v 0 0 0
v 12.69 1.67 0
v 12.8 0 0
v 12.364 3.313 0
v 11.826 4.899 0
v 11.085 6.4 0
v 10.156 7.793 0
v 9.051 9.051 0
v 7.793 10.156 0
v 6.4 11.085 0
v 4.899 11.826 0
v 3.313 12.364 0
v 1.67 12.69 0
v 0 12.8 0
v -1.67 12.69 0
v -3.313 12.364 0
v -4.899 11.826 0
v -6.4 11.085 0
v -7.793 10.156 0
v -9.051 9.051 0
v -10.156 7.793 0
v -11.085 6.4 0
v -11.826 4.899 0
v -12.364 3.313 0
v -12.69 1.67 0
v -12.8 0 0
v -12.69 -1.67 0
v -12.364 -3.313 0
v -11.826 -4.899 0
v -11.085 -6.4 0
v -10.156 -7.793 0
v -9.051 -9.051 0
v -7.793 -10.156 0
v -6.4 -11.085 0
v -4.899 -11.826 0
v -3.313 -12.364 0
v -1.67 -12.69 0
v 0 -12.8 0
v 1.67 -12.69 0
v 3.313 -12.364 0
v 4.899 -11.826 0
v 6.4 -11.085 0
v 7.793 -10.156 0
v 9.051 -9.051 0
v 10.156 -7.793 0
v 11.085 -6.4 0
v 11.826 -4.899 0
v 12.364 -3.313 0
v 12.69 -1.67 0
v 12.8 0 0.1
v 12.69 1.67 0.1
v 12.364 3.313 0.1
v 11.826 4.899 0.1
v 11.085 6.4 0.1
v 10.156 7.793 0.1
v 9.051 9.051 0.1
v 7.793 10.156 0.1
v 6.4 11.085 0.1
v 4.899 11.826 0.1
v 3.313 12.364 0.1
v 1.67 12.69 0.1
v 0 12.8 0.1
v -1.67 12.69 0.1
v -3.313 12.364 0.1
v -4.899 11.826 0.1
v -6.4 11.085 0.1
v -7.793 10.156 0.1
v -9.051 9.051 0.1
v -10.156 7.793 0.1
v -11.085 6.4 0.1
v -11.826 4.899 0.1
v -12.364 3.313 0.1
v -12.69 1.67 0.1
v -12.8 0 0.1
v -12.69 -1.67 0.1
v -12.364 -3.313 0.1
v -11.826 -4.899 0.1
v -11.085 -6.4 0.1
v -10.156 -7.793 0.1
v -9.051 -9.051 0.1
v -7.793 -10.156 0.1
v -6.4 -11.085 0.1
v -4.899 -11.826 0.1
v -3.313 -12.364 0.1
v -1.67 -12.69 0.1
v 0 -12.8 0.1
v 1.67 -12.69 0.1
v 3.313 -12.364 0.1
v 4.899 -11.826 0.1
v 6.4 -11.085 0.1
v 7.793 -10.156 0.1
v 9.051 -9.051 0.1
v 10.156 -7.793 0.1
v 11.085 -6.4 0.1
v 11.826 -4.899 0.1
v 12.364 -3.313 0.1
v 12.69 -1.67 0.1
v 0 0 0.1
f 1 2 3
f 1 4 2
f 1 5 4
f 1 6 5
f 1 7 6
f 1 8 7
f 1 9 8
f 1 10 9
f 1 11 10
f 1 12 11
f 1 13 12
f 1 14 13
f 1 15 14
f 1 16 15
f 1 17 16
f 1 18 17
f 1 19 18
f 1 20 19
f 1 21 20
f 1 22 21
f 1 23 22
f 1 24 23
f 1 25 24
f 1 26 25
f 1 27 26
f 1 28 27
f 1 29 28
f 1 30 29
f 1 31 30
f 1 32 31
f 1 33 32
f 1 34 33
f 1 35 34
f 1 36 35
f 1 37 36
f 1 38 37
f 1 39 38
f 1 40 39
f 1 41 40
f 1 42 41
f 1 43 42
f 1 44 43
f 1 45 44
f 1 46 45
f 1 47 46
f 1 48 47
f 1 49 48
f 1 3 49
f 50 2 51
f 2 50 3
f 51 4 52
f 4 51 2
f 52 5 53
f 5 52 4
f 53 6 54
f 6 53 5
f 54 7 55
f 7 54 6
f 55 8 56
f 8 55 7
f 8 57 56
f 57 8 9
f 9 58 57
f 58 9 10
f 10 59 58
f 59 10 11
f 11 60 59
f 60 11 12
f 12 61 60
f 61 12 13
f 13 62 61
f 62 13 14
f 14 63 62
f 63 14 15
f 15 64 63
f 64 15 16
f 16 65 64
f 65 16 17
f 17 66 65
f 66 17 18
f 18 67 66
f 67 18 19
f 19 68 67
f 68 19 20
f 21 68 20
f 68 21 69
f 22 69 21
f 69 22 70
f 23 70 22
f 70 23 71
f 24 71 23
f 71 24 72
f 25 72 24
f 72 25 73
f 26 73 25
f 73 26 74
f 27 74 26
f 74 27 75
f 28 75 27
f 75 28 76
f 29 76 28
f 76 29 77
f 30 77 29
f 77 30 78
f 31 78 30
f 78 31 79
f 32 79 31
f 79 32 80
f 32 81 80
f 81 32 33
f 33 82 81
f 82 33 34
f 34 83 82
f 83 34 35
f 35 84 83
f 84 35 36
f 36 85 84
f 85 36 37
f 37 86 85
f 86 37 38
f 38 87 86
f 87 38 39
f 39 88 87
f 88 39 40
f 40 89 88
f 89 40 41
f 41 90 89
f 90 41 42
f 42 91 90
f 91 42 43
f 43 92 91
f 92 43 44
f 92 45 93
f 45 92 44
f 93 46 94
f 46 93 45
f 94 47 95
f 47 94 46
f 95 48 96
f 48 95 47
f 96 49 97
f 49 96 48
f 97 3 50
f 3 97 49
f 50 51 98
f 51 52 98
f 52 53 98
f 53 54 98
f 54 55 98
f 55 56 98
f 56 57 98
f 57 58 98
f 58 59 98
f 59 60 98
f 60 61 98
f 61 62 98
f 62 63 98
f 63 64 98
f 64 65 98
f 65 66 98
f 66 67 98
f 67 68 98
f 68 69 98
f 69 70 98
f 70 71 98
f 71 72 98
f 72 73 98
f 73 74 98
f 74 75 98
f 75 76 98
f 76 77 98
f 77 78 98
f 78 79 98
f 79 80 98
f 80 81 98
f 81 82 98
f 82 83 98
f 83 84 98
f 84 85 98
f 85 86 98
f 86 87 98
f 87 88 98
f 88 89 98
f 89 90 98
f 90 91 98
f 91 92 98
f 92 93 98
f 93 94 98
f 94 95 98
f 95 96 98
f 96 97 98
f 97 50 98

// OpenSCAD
// file: ../p/48/1-4cyli.scad
use <../../lib.scad>
function ldraw_lib__48__1_4cyli() = [
// 0 Hi-Res Cylinder 0.25
// 0 Name: 48\1-4cyli.dat
// 0 Author: Magnus Forsberg [MagFors]
// 0 !LDRAW_ORG 48_Primitive UPDATE 2024-01
// 0 !LICENSE Licensed under CC BY 4.0 : see CAreadme.txt
// 
// 0 BFC CERTIFY CCW
  [0,"BFC","CERTIFY"],
  [0,"BFC","CCW"],
// 
// 0 !HISTORY 1999-07-05 [PTadmin] Official Update 1999-05
// 0 !HISTORY 2002-02-28 [hafhead] Added BFC statement
// 0 !HISTORY 2002-04-25 [PTadmin] Official Update 2002-02
// 0 !HISTORY 2007-06-24 [PTadmin] Header formatted for Contributor Agreement
// 0 !HISTORY 2008-07-01 [PTadmin] Official Update 2008-01
// 0 !HISTORY 2008-07-07 [guyvivan] Made BFC'ed CCW (2005-12-06)
// 0 !HISTORY 2009-05-02 [PTadmin] Official Update 2009-01
// 0 !HISTORY 2024-01-03 [MagFors] Complete regeneration, original by Manfred Moolhuysen
// 0 !HISTORY 2024-01-29 [OrionP] Official Update 2024-01
// 
// 4 16 0.9914 0 0.1305 1 0 0 1 1 0 0.9914 1 0.1305
  [4,16,0.9914,0,0.1305,1,0,0,1,1,0,0.9914,1,0.1305],
// 4 16 0.9659 0 0.2588 0.9914 0 0.1305 0.9914 1 0.1305 0.9659 1 0.2588
  [4,16,0.9659,0,0.2588,0.9914,0,0.1305,0.9914,1,0.1305,0.9659,1,0.2588],
// 4 16 0.9239 0 0.3827 0.9659 0 0.2588 0.9659 1 0.2588 0.9239 1 0.3827
  [4,16,0.9239,0,0.3827,0.9659,0,0.2588,0.9659,1,0.2588,0.9239,1,0.3827],
// 4 16 0.866 0 0.5 0.9239 0 0.3827 0.9239 1 0.3827 0.866 1 0.5
  [4,16,0.866,0,0.5,0.9239,0,0.3827,0.9239,1,0.3827,0.866,1,0.5],
// 4 16 0.7934 0 0.6088 0.866 0 0.5 0.866 1 0.5 0.7934 1 0.6088
  [4,16,0.7934,0,0.6088,0.866,0,0.5,0.866,1,0.5,0.7934,1,0.6088],
// 4 16 0.7071 0 0.7071 0.7934 0 0.6088 0.7934 1 0.6088 0.7071 1 0.7071
  [4,16,0.7071,0,0.7071,0.7934,0,0.6088,0.7934,1,0.6088,0.7071,1,0.7071],
// 4 16 0.6088 0 0.7934 0.7071 0 0.7071 0.7071 1 0.7071 0.6088 1 0.7934
  [4,16,0.6088,0,0.7934,0.7071,0,0.7071,0.7071,1,0.7071,0.6088,1,0.7934],
// 4 16 0.5 0 0.866 0.6088 0 0.7934 0.6088 1 0.7934 0.5 1 0.866
  [4,16,0.5,0,0.866,0.6088,0,0.7934,0.6088,1,0.7934,0.5,1,0.866],
// 4 16 0.3827 0 0.9239 0.5 0 0.866 0.5 1 0.866 0.3827 1 0.9239
  [4,16,0.3827,0,0.9239,0.5,0,0.866,0.5,1,0.866,0.3827,1,0.9239],
// 4 16 0.2588 0 0.9659 0.3827 0 0.9239 0.3827 1 0.9239 0.2588 1 0.9659
  [4,16,0.2588,0,0.9659,0.3827,0,0.9239,0.3827,1,0.9239,0.2588,1,0.9659],
// 4 16 0.1305 0 0.9914 0.2588 0 0.9659 0.2588 1 0.9659 0.1305 1 0.9914
  [4,16,0.1305,0,0.9914,0.2588,0,0.9659,0.2588,1,0.9659,0.1305,1,0.9914],
// 4 16 0 0 1 0.1305 0 0.9914 0.1305 1 0.9914 0 1 1
  [4,16,0,0,1,0.1305,0,0.9914,0.1305,1,0.9914,0,1,1],
// 0 // conditional lines
// 5 24 1 1 0 1 0 0 1 1 -0.1317 0.9914 1 0.1305
  [5,24,1,1,0,1,0,0,1,1,-0.1317,0.9914,1,0.1305],
// 5 24 0.9914 1 0.1305 0.9914 0 0.1305 1 1 0 0.9659 1 0.2588
  [5,24,0.9914,1,0.1305,0.9914,0,0.1305,1,1,0,0.9659,1,0.2588],
// 5 24 0.9659 1 0.2588 0.9659 0 0.2588 0.9914 1 0.1305 0.9239 1 0.3827
  [5,24,0.9659,1,0.2588,0.9659,0,0.2588,0.9914,1,0.1305,0.9239,1,0.3827],
// 5 24 0.9239 1 0.3827 0.9239 0 0.3827 0.9659 1 0.2588 0.866 1 0.5
  [5,24,0.9239,1,0.3827,0.9239,0,0.3827,0.9659,1,0.2588,0.866,1,0.5],
// 5 24 0.866 1 0.5 0.866 0 0.5 0.9239 1 0.3827 0.7934 1 0.6088
  [5,24,0.866,1,0.5,0.866,0,0.5,0.9239,1,0.3827,0.7934,1,0.6088],
// 5 24 0.7934 1 0.6088 0.7934 0 0.6088 0.866 1 0.5 0.7071 1 0.7071
  [5,24,0.7934,1,0.6088,0.7934,0,0.6088,0.866,1,0.5,0.7071,1,0.7071],
// 5 24 0.7071 1 0.7071 0.7071 0 0.7071 0.7934 1 0.6088 0.6088 1 0.7934
  [5,24,0.7071,1,0.7071,0.7071,0,0.7071,0.7934,1,0.6088,0.6088,1,0.7934],
// 5 24 0.6088 1 0.7934 0.6088 0 0.7934 0.7071 1 0.7071 0.5 1 0.866
  [5,24,0.6088,1,0.7934,0.6088,0,0.7934,0.7071,1,0.7071,0.5,1,0.866],
// 5 24 0.5 1 0.866 0.5 0 0.866 0.6088 1 0.7934 0.3827 1 0.9239
  [5,24,0.5,1,0.866,0.5,0,0.866,0.6088,1,0.7934,0.3827,1,0.9239],
// 5 24 0.3827 1 0.9239 0.3827 0 0.9239 0.5 1 0.866 0.2588 1 0.9659
  [5,24,0.3827,1,0.9239,0.3827,0,0.9239,0.5,1,0.866,0.2588,1,0.9659],
// 5 24 0.2588 1 0.9659 0.2588 0 0.9659 0.3827 1 0.9239 0.1305 1 0.9914
  [5,24,0.2588,1,0.9659,0.2588,0,0.9659,0.3827,1,0.9239,0.1305,1,0.9914],
// 5 24 0.1305 1 0.9914 0.1305 0 0.9914 0.2588 1 0.9659 0 1 1
  [5,24,0.1305,1,0.9914,0.1305,0,0.9914,0.2588,1,0.9659,0,1,1],
// 5 24 0 1 1 0 0 1 0.1305 1 0.9914 -0.1317 1 1
  [5,24,0,1,1,0,0,1,0.1305,1,0.9914,-0.1317,1,1],
// 0 // Build by LDPartEditor (PrimGen 2.X)
];
module ldraw_lib__48__1_4cyli(step=0, col=false, unit=2/5, alt=false, line=0.2, solid=!$preview)
    makepoly(ldraw_lib__48__1_4cyli(), step=step, col=col, unit=unit, alt=alt, line=line, solid=solid);
ldraw_lib__48__1_4cyli(line=0.2);
// file: ../p/48/4-4cyli.scad
use <../../lib.scad>
use <1-4cyli.scad>
function ldraw_lib__48__4_4cyli() = [
// 0 Hi-Res Cylinder 1.0
// 0 Name: 48\4-4cyli.dat
// 0 Author: Paul Easter [pneaster]
// 0 !LDRAW_ORG 48_Primitive UPDATE 2012-02
// 0 !LICENSE Licensed under CC BY 4.0 : see CAreadme.txt
// 
// 0 BFC CERTIFY CCW
  [0,"BFC","CERTIFY"],
  [0,"BFC","CCW"],
// 
// 0 !HISTORY 2002-08-18 [PTadmin] Official Update 2002-04
// 0 !HISTORY 2007-06-24 [PTadmin] Header formatted for Contributor Agreement
// 0 !HISTORY 2008-07-01 [PTadmin] Official Update 2008-01
// 0 !HISTORY 2012-02-27 [Philo] Changed to CCW
// 0 !HISTORY 2012-08-09 [PTadmin] Official Update 2012-02
// 
// 
// 1 16 0 0 0 1 0 0 0 1 0 0 0 1 48\1-4cyli.dat
  [1,16,0,0,0,1,0,0,0,1,0,0,0,1, ldraw_lib__48__1_4cyli()],
// 1 16 0 0 0 0 0 -1 0 1 0 1 0 0 48\1-4cyli.dat
  [1,16,0,0,0,0,0,-1,0,1,0,1,0,0, ldraw_lib__48__1_4cyli()],
// 1 16 0 0 0 -1 0 0 0 1 0 0 0 -1 48\1-4cyli.dat
  [1,16,0,0,0,-1,0,0,0,1,0,0,0,-1, ldraw_lib__48__1_4cyli()],
// 1 16 0 0 0 0 0 1 0 1 0 -1 0 0 48\1-4cyli.dat
  [1,16,0,0,0,0,0,1,0,1,0,-1,0,0, ldraw_lib__48__1_4cyli()],
];
module ldraw_lib__48__4_4cyli(step=0, col=false, unit=2/5, alt=false, line=0.2, solid=!$preview)
    makepoly(ldraw_lib__48__4_4cyli(), step=step, col=col, unit=unit, alt=alt, line=line, solid=solid);
ldraw_lib__48__4_4cyli(line=0.2);
// file: ../p/48/4-4disc.scad
use <../../lib.scad>
function ldraw_lib__48__4_4disc() = [
// 0 Hi-Res Disc 1.0
// 0 Name: 48\4-4disc.dat
// 0 Author: Willy Tschager [Holly-Wood]
// 0 !LDRAW_ORG 48_Primitive UPDATE 2024-01
// 0 !LICENSE Licensed under CC BY 4.0 : see CAreadme.txt
// 
// 0 BFC CERTIFY CCW
  [0,"BFC","CERTIFY"],
  [0,"BFC","CCW"],
// 
// 0 !HISTORY 2004-11-06 [PTadmin] Official Update 2004-04
// 0 !HISTORY 2007-06-24 [PTadmin] Header formatted for Contributor Agreement
// 0 !HISTORY 2008-07-01 [PTadmin] Official Update 2008-01
// 0 !HISTORY 2012-02-27 [Philo] Changed to CCW
// 0 !HISTORY 2012-08-09 [PTadmin] Official Update 2012-02
// 0 !HISTORY 2024-01-08 [Holly-Wood] Complete regeneration, original by hmick
// 0 !HISTORY 2024-01-29 [OrionP] Official Update 2024-01
// 
// 3 16 0 0 0 1 0 0 0.9914 0 0.1305
  [3,16,0,0,0,1,0,0,0.9914,0,0.1305],
// 3 16 0 0 0 0.9914 0 0.1305 0.9659 0 0.2588
  [3,16,0,0,0,0.9914,0,0.1305,0.9659,0,0.2588],
// 3 16 0 0 0 0.9659 0 0.2588 0.9239 0 0.3827
  [3,16,0,0,0,0.9659,0,0.2588,0.9239,0,0.3827],
// 3 16 0 0 0 0.9239 0 0.3827 0.866 0 0.5
  [3,16,0,0,0,0.9239,0,0.3827,0.866,0,0.5],
// 3 16 0 0 0 0.866 0 0.5 0.7934 0 0.6088
  [3,16,0,0,0,0.866,0,0.5,0.7934,0,0.6088],
// 3 16 0 0 0 0.7934 0 0.6088 0.7071 0 0.7071
  [3,16,0,0,0,0.7934,0,0.6088,0.7071,0,0.7071],
// 3 16 0 0 0 0.7071 0 0.7071 0.6088 0 0.7934
  [3,16,0,0,0,0.7071,0,0.7071,0.6088,0,0.7934],
// 3 16 0 0 0 0.6088 0 0.7934 0.5 0 0.866
  [3,16,0,0,0,0.6088,0,0.7934,0.5,0,0.866],
// 3 16 0 0 0 0.5 0 0.866 0.3827 0 0.9239
  [3,16,0,0,0,0.5,0,0.866,0.3827,0,0.9239],
// 3 16 0 0 0 0.3827 0 0.9239 0.2588 0 0.9659
  [3,16,0,0,0,0.3827,0,0.9239,0.2588,0,0.9659],
// 3 16 0 0 0 0.2588 0 0.9659 0.1305 0 0.9914
  [3,16,0,0,0,0.2588,0,0.9659,0.1305,0,0.9914],
// 3 16 0 0 0 0.1305 0 0.9914 0 0 1
  [3,16,0,0,0,0.1305,0,0.9914,0,0,1],
// 3 16 0 0 0 0 0 1 -0.1305 0 0.9914
  [3,16,0,0,0,0,0,1,-0.1305,0,0.9914],
// 3 16 0 0 0 -0.1305 0 0.9914 -0.2588 0 0.9659
  [3,16,0,0,0,-0.1305,0,0.9914,-0.2588,0,0.9659],
// 3 16 0 0 0 -0.2588 0 0.9659 -0.3827 0 0.9239
  [3,16,0,0,0,-0.2588,0,0.9659,-0.3827,0,0.9239],
// 3 16 0 0 0 -0.3827 0 0.9239 -0.5 0 0.866
  [3,16,0,0,0,-0.3827,0,0.9239,-0.5,0,0.866],
// 3 16 0 0 0 -0.5 0 0.866 -0.6088 0 0.7934
  [3,16,0,0,0,-0.5,0,0.866,-0.6088,0,0.7934],
// 3 16 0 0 0 -0.6088 0 0.7934 -0.7071 0 0.7071
  [3,16,0,0,0,-0.6088,0,0.7934,-0.7071,0,0.7071],
// 3 16 0 0 0 -0.7071 0 0.7071 -0.7934 0 0.6088
  [3,16,0,0,0,-0.7071,0,0.7071,-0.7934,0,0.6088],
// 3 16 0 0 0 -0.7934 0 0.6088 -0.866 0 0.5
  [3,16,0,0,0,-0.7934,0,0.6088,-0.866,0,0.5],
// 3 16 0 0 0 -0.866 0 0.5 -0.9239 0 0.3827
  [3,16,0,0,0,-0.866,0,0.5,-0.9239,0,0.3827],
// 3 16 0 0 0 -0.9239 0 0.3827 -0.9659 0 0.2588
  [3,16,0,0,0,-0.9239,0,0.3827,-0.9659,0,0.2588],
// 3 16 0 0 0 -0.9659 0 0.2588 -0.9914 0 0.1305
  [3,16,0,0,0,-0.9659,0,0.2588,-0.9914,0,0.1305],
// 3 16 0 0 0 -0.9914 0 0.1305 -1 0 0
  [3,16,0,0,0,-0.9914,0,0.1305,-1,0,0],
// 3 16 0 0 0 -1 0 0 -0.9914 0 -0.1305
  [3,16,0,0,0,-1,0,0,-0.9914,0,-0.1305],
// 3 16 0 0 0 -0.9914 0 -0.1305 -0.9659 0 -0.2588
  [3,16,0,0,0,-0.9914,0,-0.1305,-0.9659,0,-0.2588],
// 3 16 0 0 0 -0.9659 0 -0.2588 -0.9239 0 -0.3827
  [3,16,0,0,0,-0.9659,0,-0.2588,-0.9239,0,-0.3827],
// 3 16 0 0 0 -0.9239 0 -0.3827 -0.866 0 -0.5
  [3,16,0,0,0,-0.9239,0,-0.3827,-0.866,0,-0.5],
// 3 16 0 0 0 -0.866 0 -0.5 -0.7934 0 -0.6088
  [3,16,0,0,0,-0.866,0,-0.5,-0.7934,0,-0.6088],
// 3 16 0 0 0 -0.7934 0 -0.6088 -0.7071 0 -0.7071
  [3,16,0,0,0,-0.7934,0,-0.6088,-0.7071,0,-0.7071],
// 3 16 0 0 0 -0.7071 0 -0.7071 -0.6088 0 -0.7934
  [3,16,0,0,0,-0.7071,0,-0.7071,-0.6088,0,-0.7934],
// 3 16 0 0 0 -0.6088 0 -0.7934 -0.5 0 -0.866
  [3,16,0,0,0,-0.6088,0,-0.7934,-0.5,0,-0.866],
// 3 16 0 0 0 -0.5 0 -0.866 -0.3827 0 -0.9239
  [3,16,0,0,0,-0.5,0,-0.866,-0.3827,0,-0.9239],
// 3 16 0 0 0 -0.3827 0 -0.9239 -0.2588 0 -0.9659
  [3,16,0,0,0,-0.3827,0,-0.9239,-0.2588,0,-0.9659],
// 3 16 0 0 0 -0.2588 0 -0.9659 -0.1305 0 -0.9914
  [3,16,0,0,0,-0.2588,0,-0.9659,-0.1305,0,-0.9914],
// 3 16 0 0 0 -0.1305 0 -0.9914 0 0 -1
  [3,16,0,0,0,-0.1305,0,-0.9914,0,0,-1],
// 3 16 0 0 0 0 0 -1 0.1305 0 -0.9914
  [3,16,0,0,0,0,0,-1,0.1305,0,-0.9914],
// 3 16 0 0 0 0.1305 0 -0.9914 0.2588 0 -0.9659
  [3,16,0,0,0,0.1305,0,-0.9914,0.2588,0,-0.9659],
// 3 16 0 0 0 0.2588 0 -0.9659 0.3827 0 -0.9239
  [3,16,0,0,0,0.2588,0,-0.9659,0.3827,0,-0.9239],
// 3 16 0 0 0 0.3827 0 -0.9239 0.5 0 -0.866
  [3,16,0,0,0,0.3827,0,-0.9239,0.5,0,-0.866],
// 3 16 0 0 0 0.5 0 -0.866 0.6088 0 -0.7934
  [3,16,0,0,0,0.5,0,-0.866,0.6088,0,-0.7934],
// 3 16 0 0 0 0.6088 0 -0.7934 0.7071 0 -0.7071
  [3,16,0,0,0,0.6088,0,-0.7934,0.7071,0,-0.7071],
// 3 16 0 0 0 0.7071 0 -0.7071 0.7934 0 -0.6088
  [3,16,0,0,0,0.7071,0,-0.7071,0.7934,0,-0.6088],
// 3 16 0 0 0 0.7934 0 -0.6088 0.866 0 -0.5
  [3,16,0,0,0,0.7934,0,-0.6088,0.866,0,-0.5],
// 3 16 0 0 0 0.866 0 -0.5 0.9239 0 -0.3827
  [3,16,0,0,0,0.866,0,-0.5,0.9239,0,-0.3827],
// 3 16 0 0 0 0.9239 0 -0.3827 0.9659 0 -0.2588
  [3,16,0,0,0,0.9239,0,-0.3827,0.9659,0,-0.2588],
// 3 16 0 0 0 0.9659 0 -0.2588 0.9914 0 -0.1305
  [3,16,0,0,0,0.9659,0,-0.2588,0.9914,0,-0.1305],
// 3 16 0 0 0 0.9914 0 -0.1305 1 0 0
  [3,16,0,0,0,0.9914,0,-0.1305,1,0,0],
// 0 // Build by LDPartEditor (PrimGen 2.X)
];
module ldraw_lib__48__4_4disc(step=0, col=false, unit=2/5, alt=false, line=0.2, solid=!$preview)
    makepoly(ldraw_lib__48__4_4disc(), step=step, col=col, unit=unit, alt=alt, line=line, solid=solid);
ldraw_lib__48__4_4disc(line=0.2);
// file: ../p/48/4-4cylc3.scad
use <../../lib.scad>
use <4-4cyli.scad>
use <4-4disc.scad>
function ldraw_lib__48__4_4cylc3() = [
// 0 Hi-Res Cylinder Closed 1.0 without Top or Bottom Edge Lines
// 0 Name: 48\4-4cylc3.dat
// 0 Author: Chris Dee [cwdee]
// 0 !LDRAW_ORG 48_Primitive UPDATE 2017-01
// 0 !LICENSE Licensed under CC BY 4.0 : see CAreadme.txt
// 
// 0 BFC CERTIFY CCW
  [0,"BFC","CERTIFY"],
  [0,"BFC","CCW"],
// 
// 0 !HISTORY 2017-12-30 [PTadmin] Official Update 2017-01
// 
// 
// 1 16 0 0 0 1 0 0 0 1 0 0 0 1 48\4-4disc.dat
  [1,16,0,0,0,1,0,0,0,1,0,0,0,1, ldraw_lib__48__4_4disc()],
// 1 16 0 0 0 1 0 0 0 1 0 0 0 1 48\4-4cyli.dat
  [1,16,0,0,0,1,0,0,0,1,0,0,0,1, ldraw_lib__48__4_4cyli()],
// 0
];
module ldraw_lib__48__4_4cylc3(step=0, col=false, unit=2/5, alt=false, line=0.2, solid=!$preview)
    makepoly(ldraw_lib__48__4_4cylc3(), step=step, col=col, unit=unit, alt=alt, line=line, solid=solid);
ldraw_lib__48__4_4cylc3(line=0.2);
// file: 4119430a.scad
use <../lib.scad>
use <../p/48/4-4cylc3.scad>
use <../p/48/4-4disc.scad>
function ldraw_lib__4119430a() = [
// 0 Sticker  3.2 x  3.2 Round Mirror
// 0 Name: 4119430a.dat
// 0 Author: Philippe Hurbain [Philo]
// 0 !LDRAW_ORG Part UPDATE 2017-01
// 0 !LICENSE Licensed under CC BY 4.0 : see CAreadme.txt
// 
// 0 BFC CERTIFY CCW
  [0,"BFC","CERTIFY"],
  [0,"BFC","CCW"],
// 
// 0 !KEYWORDS Belville
// 
// 0 !HISTORY 2010-07-05 [PTadmin] Official Update 2010-02
// 0 !HISTORY 2011-07-11 [PTadmin] Renamed from 72602
// 0 !HISTORY 2011-07-11 [Steffen] used 4-4cylc2.dat
// 0 !HISTORY 2011-07-25 [PTadmin] Official Update 2011-01
// 0 !HISTORY 2017-07-03 [cwdee] Use cylinder primitive with conditional lines
// 0 !HISTORY 2017-12-30 [PTadmin] Official Update 2017-01
// 
// 
// 1 383 0 0 0 32 0 0 0 -0.25 0 0 0 32 48\4-4cylc3.dat
  [1,383,0,0,0,32,0,0,0,-0.25,0,0,0,32, ldraw_lib__48__4_4cylc3()],
// 1 383 0 -0.25 0 32 0 0 0 1 0 0 0 32 48\4-4disc.dat
  [1,383,0,-0.25,0,32,0,0,0,1,0,0,0,32, ldraw_lib__48__4_4disc()],
];
module ldraw_lib__4119430a(step=0, col=false, unit=2/5, alt=false, line=0.2, solid=!$preview)
    makepoly(ldraw_lib__4119430a(), step=step, col=col, unit=unit, alt=alt, line=line, solid=solid);
ldraw_lib__4119430a(line=0.2);
// main file
use <../lib.scad>
use <4119430a.scad>
function ldraw_lib__72602() = [
// 0 ~Moved to 4119430a
// 0 Name: 72602.dat
// 0 Author: [PTadmin]
// 0 !LDRAW_ORG Part UPDATE 2011-01
// 0 !LICENSE Licensed under CC BY 4.0 : see CAreadme.txt
// 
// 0 BFC CERTIFY CCW
  [0,"BFC","CERTIFY"],
  [0,"BFC","CCW"],
// 
// 0 !CATEGORY Sticker Shortcut
// 
// 0 !HISTORY 2011-07-25 [PTadmin] Official Update 2011-01
// 
// 
// 0 // Sticker Mirror Round
// 1 16 0 0 0 1 0 0 0 1 0 0 0 1 4119430a.dat
  [1,16,0,0,0,1,0,0,0,1,0,0,0,1, ldraw_lib__4119430a()],
];
module ldraw_lib__72602(step=0, col=false, unit=2/5, alt=false, line=0.2, solid=!$preview)
    makepoly(ldraw_lib__72602(), step=step, col=col, unit=unit, alt=alt, line=line, solid=solid);
ldraw_lib__72602(line=0.2);
